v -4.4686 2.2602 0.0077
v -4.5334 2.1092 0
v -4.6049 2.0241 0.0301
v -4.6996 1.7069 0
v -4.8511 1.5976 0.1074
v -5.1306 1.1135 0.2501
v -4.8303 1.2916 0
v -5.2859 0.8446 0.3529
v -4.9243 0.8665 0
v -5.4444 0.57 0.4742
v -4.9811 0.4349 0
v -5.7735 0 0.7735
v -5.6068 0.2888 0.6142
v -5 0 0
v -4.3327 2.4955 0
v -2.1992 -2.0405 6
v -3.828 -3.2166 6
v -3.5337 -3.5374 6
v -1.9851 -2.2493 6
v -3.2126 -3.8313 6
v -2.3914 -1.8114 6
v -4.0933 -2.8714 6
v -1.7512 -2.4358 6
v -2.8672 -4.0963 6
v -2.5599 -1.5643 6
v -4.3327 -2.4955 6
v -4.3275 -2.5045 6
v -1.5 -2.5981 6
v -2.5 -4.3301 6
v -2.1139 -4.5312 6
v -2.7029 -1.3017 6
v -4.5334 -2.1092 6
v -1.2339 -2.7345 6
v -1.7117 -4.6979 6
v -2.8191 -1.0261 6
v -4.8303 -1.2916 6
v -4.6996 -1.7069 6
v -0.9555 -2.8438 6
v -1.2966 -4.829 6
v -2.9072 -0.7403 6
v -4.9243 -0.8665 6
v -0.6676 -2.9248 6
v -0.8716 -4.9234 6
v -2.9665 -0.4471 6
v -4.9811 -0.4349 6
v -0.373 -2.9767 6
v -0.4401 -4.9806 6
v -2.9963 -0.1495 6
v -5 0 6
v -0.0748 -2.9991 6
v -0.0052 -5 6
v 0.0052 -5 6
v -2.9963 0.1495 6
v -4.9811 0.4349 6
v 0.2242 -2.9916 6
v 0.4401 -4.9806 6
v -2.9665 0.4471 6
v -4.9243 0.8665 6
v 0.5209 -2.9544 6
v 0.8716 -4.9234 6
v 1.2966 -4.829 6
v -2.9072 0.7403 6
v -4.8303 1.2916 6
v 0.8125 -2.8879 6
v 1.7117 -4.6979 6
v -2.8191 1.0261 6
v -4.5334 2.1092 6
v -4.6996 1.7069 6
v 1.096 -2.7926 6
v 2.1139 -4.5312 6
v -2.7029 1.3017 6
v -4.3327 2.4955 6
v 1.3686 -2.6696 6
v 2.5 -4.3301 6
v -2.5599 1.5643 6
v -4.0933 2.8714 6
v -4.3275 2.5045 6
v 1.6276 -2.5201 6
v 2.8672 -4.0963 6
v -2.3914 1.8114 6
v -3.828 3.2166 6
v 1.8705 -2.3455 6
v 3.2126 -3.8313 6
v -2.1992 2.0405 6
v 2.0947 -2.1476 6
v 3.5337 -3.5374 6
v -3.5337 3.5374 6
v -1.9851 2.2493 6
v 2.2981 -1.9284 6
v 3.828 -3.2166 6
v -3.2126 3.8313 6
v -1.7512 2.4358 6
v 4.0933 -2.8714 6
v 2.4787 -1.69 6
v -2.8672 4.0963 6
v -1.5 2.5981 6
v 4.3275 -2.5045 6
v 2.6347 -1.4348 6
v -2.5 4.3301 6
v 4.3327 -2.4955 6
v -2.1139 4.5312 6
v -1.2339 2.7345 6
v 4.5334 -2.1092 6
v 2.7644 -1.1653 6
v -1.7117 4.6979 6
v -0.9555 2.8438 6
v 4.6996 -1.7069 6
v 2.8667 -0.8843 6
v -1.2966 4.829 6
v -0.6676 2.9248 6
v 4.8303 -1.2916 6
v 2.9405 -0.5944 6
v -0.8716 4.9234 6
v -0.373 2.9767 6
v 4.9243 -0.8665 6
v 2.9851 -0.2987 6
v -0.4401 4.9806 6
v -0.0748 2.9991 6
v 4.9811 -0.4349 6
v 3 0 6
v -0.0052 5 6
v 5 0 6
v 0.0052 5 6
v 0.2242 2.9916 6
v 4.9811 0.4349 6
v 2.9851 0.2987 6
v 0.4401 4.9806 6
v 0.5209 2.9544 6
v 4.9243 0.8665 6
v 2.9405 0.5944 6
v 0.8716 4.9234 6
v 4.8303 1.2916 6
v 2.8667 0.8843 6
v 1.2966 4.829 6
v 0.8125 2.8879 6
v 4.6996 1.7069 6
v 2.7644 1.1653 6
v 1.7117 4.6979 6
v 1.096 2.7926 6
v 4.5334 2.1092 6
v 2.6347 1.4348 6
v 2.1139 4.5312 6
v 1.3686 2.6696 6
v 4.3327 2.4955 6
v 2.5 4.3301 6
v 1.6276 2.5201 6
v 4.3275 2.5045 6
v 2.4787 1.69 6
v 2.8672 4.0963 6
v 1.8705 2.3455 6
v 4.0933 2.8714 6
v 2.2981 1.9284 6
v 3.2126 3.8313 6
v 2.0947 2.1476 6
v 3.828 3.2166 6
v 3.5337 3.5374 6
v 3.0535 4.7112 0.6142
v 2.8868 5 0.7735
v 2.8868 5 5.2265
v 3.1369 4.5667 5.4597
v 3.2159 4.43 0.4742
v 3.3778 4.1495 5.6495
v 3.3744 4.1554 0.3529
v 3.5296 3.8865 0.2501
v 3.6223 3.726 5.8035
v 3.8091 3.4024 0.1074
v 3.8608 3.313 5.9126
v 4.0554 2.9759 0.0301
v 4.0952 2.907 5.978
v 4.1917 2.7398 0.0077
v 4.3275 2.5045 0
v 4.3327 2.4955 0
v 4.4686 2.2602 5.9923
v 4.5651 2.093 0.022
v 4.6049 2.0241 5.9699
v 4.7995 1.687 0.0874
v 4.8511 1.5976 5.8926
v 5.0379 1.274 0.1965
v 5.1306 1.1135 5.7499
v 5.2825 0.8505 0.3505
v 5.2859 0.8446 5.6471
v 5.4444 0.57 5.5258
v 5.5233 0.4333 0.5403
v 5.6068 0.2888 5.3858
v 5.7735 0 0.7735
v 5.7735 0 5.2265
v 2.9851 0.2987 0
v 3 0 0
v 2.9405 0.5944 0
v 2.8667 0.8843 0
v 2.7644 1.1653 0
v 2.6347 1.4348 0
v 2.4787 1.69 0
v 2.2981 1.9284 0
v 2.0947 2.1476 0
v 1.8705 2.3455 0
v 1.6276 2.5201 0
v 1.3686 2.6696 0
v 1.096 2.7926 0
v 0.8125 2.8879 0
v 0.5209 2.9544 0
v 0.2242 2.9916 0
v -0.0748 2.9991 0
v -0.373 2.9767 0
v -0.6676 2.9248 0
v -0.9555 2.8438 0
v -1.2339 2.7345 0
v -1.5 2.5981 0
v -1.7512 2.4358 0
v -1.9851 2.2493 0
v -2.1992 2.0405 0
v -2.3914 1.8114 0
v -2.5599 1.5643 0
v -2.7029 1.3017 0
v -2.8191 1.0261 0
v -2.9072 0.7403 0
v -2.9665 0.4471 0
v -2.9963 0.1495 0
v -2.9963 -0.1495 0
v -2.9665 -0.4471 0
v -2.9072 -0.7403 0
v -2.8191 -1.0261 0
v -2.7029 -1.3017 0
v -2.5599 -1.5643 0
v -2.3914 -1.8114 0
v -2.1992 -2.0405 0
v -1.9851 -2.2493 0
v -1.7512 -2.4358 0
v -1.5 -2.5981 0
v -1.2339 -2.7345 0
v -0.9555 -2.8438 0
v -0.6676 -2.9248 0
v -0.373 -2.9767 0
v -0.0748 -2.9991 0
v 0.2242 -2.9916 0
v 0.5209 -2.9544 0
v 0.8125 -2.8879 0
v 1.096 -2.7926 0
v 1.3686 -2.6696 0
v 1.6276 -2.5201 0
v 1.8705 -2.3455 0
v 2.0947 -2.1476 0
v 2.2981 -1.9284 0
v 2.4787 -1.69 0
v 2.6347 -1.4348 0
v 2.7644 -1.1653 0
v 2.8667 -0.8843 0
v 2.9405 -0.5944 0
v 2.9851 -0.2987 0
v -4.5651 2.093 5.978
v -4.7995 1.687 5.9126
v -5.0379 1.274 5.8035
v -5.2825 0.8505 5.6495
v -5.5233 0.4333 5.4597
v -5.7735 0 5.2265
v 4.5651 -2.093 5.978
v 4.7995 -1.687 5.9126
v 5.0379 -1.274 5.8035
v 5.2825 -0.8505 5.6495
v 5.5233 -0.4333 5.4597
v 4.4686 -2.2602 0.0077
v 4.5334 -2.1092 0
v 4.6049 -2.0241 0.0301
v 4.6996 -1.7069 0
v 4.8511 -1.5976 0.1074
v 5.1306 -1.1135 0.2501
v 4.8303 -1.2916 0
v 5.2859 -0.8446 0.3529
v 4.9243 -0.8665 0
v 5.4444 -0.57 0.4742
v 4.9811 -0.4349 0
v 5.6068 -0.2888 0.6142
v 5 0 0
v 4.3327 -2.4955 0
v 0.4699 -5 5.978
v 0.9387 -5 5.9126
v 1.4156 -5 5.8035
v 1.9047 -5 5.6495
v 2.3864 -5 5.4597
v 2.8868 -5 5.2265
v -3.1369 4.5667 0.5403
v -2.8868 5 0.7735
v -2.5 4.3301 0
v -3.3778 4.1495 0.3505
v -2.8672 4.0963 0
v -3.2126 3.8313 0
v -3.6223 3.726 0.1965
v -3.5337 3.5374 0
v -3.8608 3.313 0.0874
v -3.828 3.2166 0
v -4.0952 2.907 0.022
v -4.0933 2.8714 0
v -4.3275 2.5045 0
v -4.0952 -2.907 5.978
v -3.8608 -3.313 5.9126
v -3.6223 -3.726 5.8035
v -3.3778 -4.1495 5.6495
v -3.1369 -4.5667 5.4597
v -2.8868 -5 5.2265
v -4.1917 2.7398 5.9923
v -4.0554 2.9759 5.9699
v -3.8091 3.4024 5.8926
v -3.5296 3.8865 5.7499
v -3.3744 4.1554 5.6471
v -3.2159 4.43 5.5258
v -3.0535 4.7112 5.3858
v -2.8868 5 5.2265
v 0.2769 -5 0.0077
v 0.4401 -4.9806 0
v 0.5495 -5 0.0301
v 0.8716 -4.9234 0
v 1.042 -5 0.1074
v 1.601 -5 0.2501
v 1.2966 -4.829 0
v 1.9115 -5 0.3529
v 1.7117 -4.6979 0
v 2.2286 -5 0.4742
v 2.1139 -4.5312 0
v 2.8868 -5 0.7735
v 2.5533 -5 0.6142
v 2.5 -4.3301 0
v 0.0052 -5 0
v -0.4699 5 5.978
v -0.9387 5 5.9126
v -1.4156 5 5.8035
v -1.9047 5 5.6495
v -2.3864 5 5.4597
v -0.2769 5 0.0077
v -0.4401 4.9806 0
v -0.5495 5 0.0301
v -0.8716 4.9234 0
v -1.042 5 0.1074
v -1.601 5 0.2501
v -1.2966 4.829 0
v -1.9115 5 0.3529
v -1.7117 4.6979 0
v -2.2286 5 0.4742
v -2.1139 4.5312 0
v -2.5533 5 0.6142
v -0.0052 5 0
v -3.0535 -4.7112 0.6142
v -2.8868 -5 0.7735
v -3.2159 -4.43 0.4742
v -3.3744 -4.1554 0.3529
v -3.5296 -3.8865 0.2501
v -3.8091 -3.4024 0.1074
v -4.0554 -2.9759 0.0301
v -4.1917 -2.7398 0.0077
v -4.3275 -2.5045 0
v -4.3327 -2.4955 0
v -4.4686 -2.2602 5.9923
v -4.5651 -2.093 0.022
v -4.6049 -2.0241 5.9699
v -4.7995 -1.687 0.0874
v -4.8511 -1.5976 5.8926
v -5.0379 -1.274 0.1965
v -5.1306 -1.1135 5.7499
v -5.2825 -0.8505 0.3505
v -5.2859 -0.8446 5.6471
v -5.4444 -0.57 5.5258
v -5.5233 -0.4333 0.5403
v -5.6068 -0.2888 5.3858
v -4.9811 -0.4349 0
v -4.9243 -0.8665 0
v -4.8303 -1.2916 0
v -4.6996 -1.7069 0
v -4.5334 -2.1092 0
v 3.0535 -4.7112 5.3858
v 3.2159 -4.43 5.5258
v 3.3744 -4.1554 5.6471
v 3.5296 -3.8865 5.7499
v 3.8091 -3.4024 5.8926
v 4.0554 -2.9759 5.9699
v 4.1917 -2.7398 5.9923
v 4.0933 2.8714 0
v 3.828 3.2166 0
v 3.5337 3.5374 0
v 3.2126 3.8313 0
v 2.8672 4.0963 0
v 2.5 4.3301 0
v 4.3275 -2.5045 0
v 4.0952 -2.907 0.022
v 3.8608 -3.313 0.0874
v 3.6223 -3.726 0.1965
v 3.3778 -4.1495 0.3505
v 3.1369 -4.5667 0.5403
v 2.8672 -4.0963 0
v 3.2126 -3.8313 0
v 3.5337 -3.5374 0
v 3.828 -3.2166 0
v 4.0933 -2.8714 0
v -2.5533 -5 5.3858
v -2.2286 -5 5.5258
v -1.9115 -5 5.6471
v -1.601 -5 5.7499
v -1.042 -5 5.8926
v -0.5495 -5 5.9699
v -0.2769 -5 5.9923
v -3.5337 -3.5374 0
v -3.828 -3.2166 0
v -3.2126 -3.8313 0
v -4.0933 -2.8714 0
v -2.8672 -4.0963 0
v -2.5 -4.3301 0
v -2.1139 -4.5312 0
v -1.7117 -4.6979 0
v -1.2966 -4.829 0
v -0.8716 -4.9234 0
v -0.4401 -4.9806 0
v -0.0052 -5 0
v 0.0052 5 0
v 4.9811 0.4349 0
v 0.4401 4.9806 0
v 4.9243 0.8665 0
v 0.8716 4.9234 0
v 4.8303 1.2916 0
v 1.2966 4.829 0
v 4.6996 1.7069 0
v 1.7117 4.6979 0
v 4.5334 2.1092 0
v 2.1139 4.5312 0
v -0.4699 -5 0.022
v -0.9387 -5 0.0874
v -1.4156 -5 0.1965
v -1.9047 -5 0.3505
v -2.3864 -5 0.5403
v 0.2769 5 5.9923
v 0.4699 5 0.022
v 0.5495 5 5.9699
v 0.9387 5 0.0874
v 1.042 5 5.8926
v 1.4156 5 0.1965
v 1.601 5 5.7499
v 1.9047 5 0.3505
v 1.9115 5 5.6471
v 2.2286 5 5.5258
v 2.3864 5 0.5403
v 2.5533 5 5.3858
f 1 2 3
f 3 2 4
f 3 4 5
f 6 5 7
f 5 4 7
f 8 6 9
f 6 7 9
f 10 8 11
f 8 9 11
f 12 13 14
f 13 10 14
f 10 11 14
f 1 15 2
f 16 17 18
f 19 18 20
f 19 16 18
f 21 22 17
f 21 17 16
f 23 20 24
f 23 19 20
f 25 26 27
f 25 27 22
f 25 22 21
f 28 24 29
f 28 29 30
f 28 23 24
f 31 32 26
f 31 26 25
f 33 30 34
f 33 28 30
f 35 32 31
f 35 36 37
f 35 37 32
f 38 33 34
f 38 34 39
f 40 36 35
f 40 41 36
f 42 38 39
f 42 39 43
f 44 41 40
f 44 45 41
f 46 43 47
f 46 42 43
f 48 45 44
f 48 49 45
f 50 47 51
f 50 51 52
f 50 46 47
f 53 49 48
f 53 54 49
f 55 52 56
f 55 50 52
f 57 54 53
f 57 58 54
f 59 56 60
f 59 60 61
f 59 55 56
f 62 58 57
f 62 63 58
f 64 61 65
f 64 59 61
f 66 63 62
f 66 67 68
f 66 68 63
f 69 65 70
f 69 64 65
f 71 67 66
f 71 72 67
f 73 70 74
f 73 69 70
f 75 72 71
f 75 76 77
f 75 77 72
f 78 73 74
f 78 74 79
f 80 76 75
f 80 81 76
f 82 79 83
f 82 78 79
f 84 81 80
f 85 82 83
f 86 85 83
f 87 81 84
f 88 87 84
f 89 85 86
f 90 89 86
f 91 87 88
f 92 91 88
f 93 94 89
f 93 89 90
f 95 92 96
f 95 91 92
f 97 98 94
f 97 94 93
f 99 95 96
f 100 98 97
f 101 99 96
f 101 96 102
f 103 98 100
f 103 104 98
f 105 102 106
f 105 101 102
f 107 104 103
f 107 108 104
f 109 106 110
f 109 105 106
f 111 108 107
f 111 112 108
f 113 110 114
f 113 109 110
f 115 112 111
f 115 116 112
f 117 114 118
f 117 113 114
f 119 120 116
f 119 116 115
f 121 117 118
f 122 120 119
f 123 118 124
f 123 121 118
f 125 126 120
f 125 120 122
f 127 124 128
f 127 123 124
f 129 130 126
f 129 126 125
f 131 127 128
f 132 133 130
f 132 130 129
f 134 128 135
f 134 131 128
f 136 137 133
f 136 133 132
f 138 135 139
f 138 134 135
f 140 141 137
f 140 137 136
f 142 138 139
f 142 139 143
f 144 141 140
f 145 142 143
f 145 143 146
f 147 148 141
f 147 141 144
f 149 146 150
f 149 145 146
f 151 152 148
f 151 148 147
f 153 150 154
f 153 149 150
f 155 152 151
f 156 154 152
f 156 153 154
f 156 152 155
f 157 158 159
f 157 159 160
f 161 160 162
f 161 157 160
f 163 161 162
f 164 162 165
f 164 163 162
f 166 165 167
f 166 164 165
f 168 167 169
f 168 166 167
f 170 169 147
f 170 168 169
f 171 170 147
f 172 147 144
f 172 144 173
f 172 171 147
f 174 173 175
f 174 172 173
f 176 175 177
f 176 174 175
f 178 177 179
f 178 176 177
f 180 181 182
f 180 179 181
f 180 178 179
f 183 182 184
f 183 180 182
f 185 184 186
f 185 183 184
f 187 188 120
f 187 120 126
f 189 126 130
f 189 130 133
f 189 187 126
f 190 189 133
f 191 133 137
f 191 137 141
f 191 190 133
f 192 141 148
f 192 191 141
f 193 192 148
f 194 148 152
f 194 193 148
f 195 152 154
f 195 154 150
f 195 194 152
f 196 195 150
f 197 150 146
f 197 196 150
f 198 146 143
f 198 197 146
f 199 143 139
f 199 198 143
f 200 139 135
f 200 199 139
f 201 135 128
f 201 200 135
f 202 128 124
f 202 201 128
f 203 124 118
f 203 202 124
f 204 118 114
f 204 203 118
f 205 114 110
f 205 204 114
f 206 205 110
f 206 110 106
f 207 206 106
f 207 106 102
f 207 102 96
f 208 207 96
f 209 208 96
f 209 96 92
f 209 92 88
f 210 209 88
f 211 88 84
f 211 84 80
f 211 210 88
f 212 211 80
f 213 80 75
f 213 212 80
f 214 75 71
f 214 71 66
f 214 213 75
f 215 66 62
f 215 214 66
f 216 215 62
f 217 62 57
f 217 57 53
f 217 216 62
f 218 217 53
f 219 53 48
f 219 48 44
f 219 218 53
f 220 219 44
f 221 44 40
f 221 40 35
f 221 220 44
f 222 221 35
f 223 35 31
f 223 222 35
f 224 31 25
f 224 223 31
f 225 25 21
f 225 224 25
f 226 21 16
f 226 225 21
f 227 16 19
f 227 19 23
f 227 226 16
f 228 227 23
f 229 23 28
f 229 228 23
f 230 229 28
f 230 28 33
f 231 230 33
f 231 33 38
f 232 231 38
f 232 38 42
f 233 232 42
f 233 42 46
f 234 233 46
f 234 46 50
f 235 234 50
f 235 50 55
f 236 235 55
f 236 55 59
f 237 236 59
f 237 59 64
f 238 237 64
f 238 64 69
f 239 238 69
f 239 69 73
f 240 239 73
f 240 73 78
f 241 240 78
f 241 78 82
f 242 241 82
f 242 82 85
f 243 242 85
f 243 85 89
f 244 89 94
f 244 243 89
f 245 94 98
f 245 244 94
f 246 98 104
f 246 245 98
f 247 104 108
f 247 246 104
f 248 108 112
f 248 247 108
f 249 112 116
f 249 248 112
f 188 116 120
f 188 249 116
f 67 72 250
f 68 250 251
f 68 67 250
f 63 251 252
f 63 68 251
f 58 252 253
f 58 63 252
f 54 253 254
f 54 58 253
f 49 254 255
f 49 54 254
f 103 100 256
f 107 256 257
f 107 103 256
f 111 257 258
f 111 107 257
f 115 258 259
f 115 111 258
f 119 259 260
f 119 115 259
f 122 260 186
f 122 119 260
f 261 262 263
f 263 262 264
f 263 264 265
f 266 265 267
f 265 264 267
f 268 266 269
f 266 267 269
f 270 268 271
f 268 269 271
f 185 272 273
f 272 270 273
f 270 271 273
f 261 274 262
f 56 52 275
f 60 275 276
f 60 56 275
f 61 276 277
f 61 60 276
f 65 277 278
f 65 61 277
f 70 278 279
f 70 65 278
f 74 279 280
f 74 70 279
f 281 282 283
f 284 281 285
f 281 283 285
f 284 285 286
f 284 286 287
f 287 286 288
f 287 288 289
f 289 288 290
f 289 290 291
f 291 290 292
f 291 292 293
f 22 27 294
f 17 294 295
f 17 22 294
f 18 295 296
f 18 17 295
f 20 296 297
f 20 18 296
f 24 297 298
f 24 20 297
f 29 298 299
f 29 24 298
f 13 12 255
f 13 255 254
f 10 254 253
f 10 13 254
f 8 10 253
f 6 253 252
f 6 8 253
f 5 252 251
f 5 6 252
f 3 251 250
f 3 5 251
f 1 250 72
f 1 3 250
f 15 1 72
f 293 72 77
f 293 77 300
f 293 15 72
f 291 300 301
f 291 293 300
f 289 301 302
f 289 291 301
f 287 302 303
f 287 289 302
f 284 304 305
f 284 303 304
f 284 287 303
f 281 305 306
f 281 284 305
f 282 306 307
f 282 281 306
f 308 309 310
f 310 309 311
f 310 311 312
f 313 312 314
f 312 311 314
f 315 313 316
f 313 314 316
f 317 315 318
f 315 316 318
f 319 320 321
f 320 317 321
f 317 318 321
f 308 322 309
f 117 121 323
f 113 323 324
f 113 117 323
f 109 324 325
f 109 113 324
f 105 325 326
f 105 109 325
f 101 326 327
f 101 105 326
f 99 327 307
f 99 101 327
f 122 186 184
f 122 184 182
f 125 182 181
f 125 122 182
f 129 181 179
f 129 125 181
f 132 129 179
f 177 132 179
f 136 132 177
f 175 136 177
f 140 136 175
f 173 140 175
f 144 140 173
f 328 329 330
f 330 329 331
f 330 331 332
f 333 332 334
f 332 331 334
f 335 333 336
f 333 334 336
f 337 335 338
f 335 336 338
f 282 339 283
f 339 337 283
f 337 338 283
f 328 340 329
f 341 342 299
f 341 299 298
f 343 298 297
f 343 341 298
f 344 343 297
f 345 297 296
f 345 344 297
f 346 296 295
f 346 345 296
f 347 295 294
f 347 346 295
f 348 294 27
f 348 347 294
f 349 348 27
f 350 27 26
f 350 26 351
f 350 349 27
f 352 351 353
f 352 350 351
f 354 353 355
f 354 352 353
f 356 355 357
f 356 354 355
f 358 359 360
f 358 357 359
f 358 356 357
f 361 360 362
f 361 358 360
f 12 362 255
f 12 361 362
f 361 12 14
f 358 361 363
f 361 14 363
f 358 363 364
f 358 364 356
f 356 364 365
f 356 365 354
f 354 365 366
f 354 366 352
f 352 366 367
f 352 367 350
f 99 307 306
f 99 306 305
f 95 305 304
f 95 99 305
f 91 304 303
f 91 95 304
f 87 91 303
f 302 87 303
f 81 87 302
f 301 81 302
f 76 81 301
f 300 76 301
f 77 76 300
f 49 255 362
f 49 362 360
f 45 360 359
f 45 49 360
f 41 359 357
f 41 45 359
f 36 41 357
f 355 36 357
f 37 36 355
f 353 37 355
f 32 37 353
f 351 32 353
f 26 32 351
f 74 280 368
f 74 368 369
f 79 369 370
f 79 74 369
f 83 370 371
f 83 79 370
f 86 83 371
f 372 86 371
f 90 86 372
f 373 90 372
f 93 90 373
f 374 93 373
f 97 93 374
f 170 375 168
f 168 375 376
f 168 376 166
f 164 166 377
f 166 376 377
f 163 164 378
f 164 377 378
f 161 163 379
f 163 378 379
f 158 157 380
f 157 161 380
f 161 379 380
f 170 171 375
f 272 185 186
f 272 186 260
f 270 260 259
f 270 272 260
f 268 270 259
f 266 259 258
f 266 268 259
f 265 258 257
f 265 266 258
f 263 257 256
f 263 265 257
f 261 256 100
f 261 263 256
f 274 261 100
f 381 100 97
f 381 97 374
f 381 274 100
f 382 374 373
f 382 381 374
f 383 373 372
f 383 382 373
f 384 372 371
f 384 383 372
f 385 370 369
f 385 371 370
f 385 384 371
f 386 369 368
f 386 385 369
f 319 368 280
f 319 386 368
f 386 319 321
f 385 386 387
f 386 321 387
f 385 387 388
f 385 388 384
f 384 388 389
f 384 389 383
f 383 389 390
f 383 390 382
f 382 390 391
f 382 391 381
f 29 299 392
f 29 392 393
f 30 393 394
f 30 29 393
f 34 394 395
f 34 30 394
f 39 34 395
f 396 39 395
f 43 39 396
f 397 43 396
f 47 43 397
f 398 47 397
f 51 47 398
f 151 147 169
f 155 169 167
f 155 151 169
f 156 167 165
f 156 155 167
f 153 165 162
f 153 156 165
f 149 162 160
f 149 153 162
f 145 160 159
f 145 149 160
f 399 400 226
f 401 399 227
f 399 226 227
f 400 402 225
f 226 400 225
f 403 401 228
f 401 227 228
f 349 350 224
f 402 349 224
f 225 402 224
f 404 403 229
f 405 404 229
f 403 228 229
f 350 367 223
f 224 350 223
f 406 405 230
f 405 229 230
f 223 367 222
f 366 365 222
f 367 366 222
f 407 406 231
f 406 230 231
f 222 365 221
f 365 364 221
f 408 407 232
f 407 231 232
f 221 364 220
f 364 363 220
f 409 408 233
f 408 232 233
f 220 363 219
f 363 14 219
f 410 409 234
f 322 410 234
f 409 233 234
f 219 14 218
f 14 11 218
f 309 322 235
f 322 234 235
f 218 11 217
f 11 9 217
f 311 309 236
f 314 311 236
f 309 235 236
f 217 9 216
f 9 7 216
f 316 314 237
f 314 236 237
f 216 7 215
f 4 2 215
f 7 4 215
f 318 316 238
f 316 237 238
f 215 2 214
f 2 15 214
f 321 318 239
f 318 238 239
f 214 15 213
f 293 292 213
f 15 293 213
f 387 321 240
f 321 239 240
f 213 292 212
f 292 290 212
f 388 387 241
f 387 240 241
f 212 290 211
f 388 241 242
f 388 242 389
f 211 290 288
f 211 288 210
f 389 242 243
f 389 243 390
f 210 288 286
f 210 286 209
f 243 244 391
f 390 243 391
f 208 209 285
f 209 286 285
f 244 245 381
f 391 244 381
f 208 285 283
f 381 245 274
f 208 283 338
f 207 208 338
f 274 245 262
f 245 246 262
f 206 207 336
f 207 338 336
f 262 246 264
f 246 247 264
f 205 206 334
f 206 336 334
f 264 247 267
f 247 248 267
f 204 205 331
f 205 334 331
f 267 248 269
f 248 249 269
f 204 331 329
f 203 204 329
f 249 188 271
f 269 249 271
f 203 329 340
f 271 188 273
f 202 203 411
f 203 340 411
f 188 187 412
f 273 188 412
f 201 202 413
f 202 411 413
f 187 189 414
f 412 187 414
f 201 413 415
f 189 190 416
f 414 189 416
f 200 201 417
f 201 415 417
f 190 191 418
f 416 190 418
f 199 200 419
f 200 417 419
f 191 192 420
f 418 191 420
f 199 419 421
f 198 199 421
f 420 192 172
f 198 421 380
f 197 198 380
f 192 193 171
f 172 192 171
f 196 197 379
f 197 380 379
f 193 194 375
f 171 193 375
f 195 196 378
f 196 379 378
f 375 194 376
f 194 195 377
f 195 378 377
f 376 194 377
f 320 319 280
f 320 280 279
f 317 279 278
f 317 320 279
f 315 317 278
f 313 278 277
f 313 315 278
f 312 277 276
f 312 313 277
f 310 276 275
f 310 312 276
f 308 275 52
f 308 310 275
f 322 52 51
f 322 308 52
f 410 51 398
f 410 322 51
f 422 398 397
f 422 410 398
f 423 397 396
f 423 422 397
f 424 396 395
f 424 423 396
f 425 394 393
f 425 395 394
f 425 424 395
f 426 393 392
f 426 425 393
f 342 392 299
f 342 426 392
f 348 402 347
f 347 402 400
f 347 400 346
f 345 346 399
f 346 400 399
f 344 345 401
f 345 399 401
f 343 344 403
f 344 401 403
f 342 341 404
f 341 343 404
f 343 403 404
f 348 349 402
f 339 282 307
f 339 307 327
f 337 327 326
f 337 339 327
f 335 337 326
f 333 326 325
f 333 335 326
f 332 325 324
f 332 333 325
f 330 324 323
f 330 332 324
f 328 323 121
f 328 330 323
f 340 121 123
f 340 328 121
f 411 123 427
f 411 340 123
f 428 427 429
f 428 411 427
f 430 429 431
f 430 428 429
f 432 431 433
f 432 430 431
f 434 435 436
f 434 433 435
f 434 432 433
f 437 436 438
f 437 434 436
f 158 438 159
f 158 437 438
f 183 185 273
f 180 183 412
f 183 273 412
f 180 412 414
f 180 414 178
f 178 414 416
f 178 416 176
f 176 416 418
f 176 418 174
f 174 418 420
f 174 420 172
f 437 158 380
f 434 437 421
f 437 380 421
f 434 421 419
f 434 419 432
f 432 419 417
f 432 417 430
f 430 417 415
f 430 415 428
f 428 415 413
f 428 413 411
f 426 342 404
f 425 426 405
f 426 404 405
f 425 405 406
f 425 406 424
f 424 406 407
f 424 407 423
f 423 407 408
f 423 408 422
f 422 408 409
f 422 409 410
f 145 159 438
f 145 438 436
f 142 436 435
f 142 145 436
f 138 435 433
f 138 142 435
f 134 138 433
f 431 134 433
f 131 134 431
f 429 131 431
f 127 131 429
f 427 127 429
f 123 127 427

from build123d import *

# Parameters (mm, degrees)
F0_R     = 3
F1_DEPTH = 6
F2_SIZE  = 0.7735
F3_DEPTH = 6.001


# Not quite as in the source:
# - a feature names something its author has since deleted; it is built from what else it names


with BuildPart() as f1:
    # F0 (on Top) → F1 (new body)
    with BuildSketch(Plane.XY):
        Polygon((2.8867513459, 5), (-2.8867513459, 5), (-5.7735026919, 0), (-2.8867513459, -5), (2.8867513459, -5), (5.7735026919, 0), align=None)
        Circle(F0_R, mode=Mode.SUBTRACT)
        with BuildLine():
            Line((-5.7735026919, 0), (-2.8867513459, 5))
            ThreePointArc((-2.8867513459, 5), (-5, 2.8867513459), (-5.7735026919, 0))
        make_face()
        with BuildLine():
            Line((-2.8867513459, -5), (-5.7735026919, 0))
            ThreePointArc((-5.7735026919, 0), (-5, -2.8867513459), (-2.8867513459, -5))
        make_face()
        with BuildLine():
            ThreePointArc((2.8867513459, -5), (5, -2.8867513459), (5.7735026919, 0))
            Line((5.7735026919, 0), (2.8867513459, -5))
        make_face()
        with BuildLine():
            ThreePointArc((5.7735026919, 0), (5, 2.8867513459), (2.8867513459, 5))
            Line((2.8867513459, 5), (5.7735026919, 0))
        make_face()
        with BuildLine():
            ThreePointArc((2.8867513459, 5), (0, 5.7735026919), (-2.8867513459, 5))
            Line((-2.8867513459, 5), (2.8867513459, 5))
        make_face()
        with BuildLine():
            Line((2.8867513459, -5), (-2.8867513459, -5))
            ThreePointArc((-2.8867513459, -5), (0, -5.7735026919), (2.8867513459, -5))
        make_face()
    extrude(amount=F1_DEPTH)

    # F2
    f2_edges = [f1.edges().sort_by_distance(p)[0] for p in [
        (2.886751, 5, 6),
        (2.886751, 5, 0),
    ]]
    chamfer(f2_edges, length=F2_SIZE)

    # F0 (on Top) → F3 (cut, through all)
    with BuildSketch(Plane.XY):
        with BuildLine():
            Line((-2.8867513459, -5), (-5.7735026919, 0))
            ThreePointArc((-5.7735026919, 0), (-5, -2.8867513459), (-2.8867513459, -5))
        make_face()
        with BuildLine():
            Line((-5.7735026919, 0), (-2.8867513459, 5))
            ThreePointArc((-2.8867513459, 5), (-5, 2.8867513459), (-5.7735026919, 0))
        make_face()
        with BuildLine():
            ThreePointArc((2.8867513459, 5), (0, 5.7735026919), (-2.8867513459, 5))
            Line((-2.8867513459, 5), (2.8867513459, 5))
        make_face()
        with BuildLine():
            ThreePointArc((5.7735026919, 0), (5, 2.8867513459), (2.8867513459, 5))
            Line((2.8867513459, 5), (5.7735026919, 0))
        make_face()
        with BuildLine():
            ThreePointArc((2.8867513459, -5), (5, -2.8867513459), (5.7735026919, 0))
            Line((5.7735026919, 0), (2.8867513459, -5))
        make_face()
        with BuildLine():
            Line((2.8867513459, -5), (-2.8867513459, -5))
            ThreePointArc((-2.8867513459, -5), (0, -5.7735026919), (2.8867513459, -5))
        make_face()
    extrude(amount=F3_DEPTH, mode=Mode.SUBTRACT)


solid = f1.part
